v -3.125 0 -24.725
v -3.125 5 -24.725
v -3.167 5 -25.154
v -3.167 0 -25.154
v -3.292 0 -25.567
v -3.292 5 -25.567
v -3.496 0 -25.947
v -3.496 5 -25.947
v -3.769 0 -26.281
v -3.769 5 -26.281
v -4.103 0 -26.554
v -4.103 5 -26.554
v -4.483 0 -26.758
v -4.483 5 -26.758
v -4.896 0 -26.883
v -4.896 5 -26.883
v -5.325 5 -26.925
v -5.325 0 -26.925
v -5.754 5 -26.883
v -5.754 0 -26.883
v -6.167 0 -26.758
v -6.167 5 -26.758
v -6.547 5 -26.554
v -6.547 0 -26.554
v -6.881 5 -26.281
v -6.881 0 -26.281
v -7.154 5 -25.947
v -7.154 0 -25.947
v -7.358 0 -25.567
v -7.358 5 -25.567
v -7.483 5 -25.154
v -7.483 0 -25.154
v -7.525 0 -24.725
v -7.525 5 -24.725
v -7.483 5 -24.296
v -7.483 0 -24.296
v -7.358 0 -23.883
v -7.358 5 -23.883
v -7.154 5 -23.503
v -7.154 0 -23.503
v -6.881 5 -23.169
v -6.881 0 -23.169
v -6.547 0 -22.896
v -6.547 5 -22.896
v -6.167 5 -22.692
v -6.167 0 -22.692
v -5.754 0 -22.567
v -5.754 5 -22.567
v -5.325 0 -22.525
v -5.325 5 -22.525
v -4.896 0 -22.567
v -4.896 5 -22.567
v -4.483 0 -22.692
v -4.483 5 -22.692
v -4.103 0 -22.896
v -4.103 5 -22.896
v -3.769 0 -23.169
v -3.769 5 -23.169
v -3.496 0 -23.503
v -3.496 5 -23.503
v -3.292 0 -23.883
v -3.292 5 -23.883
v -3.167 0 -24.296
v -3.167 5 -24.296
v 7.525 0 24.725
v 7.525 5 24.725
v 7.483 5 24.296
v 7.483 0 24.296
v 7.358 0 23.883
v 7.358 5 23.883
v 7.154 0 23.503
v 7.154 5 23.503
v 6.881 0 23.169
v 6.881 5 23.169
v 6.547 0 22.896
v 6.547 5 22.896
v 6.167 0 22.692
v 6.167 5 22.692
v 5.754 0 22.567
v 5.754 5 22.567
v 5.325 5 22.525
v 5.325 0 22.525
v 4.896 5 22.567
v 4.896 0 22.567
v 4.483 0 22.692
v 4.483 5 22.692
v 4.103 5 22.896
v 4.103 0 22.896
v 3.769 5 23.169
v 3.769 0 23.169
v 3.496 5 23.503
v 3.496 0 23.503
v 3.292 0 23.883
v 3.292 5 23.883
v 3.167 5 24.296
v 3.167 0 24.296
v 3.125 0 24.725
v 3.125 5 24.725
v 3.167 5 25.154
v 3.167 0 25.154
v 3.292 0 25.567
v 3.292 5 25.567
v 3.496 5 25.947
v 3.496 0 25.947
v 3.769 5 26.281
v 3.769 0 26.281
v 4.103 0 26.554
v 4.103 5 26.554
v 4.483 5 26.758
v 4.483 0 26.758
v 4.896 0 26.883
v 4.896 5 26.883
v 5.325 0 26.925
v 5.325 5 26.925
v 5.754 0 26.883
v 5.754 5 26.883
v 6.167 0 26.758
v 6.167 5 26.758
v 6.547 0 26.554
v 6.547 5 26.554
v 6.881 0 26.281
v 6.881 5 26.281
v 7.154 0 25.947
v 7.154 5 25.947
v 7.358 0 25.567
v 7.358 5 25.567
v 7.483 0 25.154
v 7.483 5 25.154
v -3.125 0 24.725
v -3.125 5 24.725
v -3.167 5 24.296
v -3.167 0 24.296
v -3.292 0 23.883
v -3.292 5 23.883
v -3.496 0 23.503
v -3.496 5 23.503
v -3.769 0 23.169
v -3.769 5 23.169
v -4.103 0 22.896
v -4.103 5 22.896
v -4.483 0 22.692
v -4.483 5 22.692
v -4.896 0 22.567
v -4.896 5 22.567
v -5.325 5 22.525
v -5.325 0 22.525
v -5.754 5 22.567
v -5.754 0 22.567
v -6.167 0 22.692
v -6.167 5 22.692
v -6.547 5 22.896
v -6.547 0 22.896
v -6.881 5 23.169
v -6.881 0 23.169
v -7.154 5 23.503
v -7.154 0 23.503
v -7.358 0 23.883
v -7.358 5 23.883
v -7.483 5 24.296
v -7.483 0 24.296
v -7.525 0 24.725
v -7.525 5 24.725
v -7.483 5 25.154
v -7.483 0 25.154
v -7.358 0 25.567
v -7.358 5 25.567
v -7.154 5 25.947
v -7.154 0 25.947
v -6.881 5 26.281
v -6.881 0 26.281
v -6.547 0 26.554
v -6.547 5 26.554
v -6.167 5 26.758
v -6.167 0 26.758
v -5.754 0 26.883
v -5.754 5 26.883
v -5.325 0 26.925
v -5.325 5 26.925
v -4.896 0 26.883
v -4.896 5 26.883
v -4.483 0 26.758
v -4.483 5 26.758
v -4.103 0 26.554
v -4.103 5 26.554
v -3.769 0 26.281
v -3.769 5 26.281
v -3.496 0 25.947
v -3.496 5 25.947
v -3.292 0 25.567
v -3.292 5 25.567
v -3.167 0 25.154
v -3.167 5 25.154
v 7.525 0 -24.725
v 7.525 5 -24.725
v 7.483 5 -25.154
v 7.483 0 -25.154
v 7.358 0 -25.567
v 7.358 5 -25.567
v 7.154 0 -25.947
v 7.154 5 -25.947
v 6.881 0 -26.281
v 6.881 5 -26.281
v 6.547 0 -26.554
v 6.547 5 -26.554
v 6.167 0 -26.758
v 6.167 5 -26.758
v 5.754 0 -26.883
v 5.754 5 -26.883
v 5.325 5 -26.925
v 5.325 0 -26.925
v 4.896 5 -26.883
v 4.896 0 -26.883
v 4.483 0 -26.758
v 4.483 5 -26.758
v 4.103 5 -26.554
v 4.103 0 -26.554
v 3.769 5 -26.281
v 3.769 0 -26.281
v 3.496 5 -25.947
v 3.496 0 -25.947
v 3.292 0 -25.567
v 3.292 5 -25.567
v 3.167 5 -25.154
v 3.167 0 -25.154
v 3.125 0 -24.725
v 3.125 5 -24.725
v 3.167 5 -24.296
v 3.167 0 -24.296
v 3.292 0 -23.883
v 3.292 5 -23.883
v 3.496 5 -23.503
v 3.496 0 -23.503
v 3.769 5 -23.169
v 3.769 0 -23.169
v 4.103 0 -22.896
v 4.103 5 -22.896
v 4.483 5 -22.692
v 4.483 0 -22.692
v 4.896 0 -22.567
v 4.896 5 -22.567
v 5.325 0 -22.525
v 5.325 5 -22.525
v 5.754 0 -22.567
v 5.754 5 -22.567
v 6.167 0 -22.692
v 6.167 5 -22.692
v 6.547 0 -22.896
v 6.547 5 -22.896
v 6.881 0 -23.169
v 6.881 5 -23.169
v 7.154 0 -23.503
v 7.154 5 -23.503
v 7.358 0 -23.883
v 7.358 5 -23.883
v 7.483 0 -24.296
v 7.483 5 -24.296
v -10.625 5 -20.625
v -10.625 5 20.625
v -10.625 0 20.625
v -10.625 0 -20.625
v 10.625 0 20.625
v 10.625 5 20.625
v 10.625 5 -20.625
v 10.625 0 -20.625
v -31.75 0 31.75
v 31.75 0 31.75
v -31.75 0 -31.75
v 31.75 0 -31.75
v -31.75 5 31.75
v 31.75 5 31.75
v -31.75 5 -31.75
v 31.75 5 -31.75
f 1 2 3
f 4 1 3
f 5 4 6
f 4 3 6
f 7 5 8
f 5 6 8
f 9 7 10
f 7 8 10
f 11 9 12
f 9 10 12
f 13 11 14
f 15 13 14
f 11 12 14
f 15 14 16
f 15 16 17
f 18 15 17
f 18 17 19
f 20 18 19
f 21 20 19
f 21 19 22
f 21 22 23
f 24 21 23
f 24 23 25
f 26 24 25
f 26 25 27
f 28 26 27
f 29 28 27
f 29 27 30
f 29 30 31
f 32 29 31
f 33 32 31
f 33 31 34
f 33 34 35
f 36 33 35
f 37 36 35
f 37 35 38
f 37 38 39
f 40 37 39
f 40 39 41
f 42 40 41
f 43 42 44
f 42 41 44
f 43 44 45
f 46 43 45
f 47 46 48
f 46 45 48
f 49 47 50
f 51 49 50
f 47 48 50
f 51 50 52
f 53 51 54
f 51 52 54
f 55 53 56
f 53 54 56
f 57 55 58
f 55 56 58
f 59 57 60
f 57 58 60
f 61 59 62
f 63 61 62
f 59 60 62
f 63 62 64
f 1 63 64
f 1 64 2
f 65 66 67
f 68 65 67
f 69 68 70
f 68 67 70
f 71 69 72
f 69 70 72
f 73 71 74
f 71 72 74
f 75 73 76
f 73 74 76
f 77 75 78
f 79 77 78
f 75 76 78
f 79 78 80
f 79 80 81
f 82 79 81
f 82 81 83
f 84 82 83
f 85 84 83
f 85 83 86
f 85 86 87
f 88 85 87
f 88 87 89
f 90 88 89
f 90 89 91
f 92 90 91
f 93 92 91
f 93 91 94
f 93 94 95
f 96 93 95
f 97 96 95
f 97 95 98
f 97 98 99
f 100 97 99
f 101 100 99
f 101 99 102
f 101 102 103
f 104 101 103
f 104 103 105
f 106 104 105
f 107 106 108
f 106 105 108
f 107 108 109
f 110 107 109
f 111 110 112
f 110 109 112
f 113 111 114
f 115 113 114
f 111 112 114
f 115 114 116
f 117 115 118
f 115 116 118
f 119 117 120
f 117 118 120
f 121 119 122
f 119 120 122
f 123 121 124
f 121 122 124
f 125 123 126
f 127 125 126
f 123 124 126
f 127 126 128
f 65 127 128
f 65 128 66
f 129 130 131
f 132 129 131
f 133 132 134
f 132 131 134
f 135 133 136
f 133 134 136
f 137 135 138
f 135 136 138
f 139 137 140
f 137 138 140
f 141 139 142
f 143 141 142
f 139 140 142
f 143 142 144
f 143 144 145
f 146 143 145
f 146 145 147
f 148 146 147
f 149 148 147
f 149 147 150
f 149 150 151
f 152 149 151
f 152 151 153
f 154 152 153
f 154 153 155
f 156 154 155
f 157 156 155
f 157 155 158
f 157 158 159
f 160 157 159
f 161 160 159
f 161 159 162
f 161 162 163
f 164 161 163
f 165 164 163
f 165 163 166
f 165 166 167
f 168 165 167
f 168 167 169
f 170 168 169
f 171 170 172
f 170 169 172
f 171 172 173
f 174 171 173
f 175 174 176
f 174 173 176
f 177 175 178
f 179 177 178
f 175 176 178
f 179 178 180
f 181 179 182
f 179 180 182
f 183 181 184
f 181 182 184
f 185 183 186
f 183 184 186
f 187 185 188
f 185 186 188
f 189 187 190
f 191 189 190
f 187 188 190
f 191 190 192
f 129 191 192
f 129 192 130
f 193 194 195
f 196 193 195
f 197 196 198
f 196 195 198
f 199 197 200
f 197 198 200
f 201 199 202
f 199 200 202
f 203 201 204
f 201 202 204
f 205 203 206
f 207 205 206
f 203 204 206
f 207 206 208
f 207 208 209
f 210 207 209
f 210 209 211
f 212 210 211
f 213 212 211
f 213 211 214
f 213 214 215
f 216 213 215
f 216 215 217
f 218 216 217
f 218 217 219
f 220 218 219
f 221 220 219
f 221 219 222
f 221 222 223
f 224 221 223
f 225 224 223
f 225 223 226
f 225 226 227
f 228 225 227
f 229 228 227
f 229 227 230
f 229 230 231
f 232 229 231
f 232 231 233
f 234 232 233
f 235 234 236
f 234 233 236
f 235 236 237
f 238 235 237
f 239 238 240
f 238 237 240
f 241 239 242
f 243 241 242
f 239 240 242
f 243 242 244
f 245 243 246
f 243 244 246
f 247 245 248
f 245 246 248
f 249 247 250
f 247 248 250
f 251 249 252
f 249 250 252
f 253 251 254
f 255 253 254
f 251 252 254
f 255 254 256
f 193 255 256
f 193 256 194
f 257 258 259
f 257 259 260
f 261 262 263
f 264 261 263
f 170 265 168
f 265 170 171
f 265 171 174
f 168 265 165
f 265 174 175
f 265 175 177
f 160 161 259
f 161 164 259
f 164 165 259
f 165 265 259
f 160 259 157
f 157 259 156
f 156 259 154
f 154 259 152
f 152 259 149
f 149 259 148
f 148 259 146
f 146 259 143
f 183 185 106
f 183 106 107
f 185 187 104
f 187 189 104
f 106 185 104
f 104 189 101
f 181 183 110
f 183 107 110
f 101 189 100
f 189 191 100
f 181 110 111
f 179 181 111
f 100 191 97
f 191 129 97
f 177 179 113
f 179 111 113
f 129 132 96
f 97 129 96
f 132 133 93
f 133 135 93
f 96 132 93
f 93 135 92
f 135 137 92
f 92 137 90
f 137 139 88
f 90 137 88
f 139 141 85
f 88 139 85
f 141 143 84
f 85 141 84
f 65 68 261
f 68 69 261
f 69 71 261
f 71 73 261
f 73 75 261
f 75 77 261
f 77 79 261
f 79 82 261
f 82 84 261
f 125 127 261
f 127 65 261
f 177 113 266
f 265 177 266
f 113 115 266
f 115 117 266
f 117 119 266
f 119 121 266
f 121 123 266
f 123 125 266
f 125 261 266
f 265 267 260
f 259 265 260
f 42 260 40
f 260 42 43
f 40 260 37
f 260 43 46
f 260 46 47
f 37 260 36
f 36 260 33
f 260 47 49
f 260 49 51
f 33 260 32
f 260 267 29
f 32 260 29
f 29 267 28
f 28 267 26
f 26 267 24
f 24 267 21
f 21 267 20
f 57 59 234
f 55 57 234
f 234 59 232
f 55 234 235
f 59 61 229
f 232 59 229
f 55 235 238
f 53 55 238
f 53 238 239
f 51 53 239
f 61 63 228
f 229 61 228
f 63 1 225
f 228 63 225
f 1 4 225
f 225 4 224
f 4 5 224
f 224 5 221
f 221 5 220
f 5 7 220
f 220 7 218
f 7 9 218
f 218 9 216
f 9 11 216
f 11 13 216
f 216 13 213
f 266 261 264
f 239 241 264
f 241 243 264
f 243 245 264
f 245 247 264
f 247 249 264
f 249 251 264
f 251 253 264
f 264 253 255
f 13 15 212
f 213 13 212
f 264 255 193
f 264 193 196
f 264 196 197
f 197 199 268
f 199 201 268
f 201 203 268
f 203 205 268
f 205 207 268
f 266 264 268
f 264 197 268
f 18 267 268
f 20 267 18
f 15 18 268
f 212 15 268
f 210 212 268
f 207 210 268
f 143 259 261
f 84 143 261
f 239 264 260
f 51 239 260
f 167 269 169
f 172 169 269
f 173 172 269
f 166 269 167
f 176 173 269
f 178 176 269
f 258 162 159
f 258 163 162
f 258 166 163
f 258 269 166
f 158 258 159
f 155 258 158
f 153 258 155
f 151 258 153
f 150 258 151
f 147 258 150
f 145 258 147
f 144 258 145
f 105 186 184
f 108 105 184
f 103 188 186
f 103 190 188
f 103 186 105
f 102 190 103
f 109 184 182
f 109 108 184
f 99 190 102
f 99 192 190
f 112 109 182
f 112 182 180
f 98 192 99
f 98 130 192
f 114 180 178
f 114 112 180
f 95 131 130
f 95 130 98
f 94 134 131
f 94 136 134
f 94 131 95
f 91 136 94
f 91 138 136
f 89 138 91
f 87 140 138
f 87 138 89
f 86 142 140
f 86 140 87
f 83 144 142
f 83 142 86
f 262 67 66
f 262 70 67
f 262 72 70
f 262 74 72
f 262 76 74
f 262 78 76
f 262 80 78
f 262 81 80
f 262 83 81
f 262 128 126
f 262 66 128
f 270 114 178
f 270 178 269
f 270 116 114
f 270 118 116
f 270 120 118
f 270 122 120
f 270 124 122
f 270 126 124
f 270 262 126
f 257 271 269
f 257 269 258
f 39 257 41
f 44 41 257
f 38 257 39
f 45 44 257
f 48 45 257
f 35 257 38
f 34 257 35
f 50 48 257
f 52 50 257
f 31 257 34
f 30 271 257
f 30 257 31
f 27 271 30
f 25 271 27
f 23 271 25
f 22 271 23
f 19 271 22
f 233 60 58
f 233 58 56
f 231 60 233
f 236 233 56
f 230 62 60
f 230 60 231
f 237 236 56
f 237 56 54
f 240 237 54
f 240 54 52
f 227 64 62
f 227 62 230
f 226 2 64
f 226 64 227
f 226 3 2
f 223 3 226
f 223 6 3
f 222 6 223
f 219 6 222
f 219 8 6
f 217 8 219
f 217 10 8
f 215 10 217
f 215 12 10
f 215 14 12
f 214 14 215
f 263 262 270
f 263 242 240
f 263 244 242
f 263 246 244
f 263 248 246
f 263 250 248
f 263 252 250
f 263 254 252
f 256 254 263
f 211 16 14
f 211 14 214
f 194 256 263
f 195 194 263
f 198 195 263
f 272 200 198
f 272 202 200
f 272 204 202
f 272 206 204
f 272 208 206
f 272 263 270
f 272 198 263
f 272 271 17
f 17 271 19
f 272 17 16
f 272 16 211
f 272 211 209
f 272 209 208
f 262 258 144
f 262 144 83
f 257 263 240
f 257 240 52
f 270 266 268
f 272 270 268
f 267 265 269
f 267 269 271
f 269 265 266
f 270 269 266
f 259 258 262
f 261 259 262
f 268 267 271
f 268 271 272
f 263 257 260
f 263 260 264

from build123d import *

# Parameters (mm, degrees)
SKETCH2_W           = 63.5
SKETCH2_H           = 63.5
BOSS_EXTRUDE1_DEPTH = 5
SKETCH3_R           = 2.2
SKETCH3_W           = 21.25
SKETCH3_H           = 41.25
CUT_EXTRUDE1_DEPTH  = 6


with BuildPart() as part:
    # Sketch2 → Boss-Extrude1 (new body)
    with BuildSketch(Plane(origin=(0, 0, 0), x_dir=(1, 0, 0), z_dir=(0, 1, 0))):
        Rectangle(SKETCH2_W, SKETCH2_H)
    extrude(amount=BOSS_EXTRUDE1_DEPTH)

    # Sketch3 → Cut-Extrude1 (cut, through all)
    with BuildSketch(Plane(origin=(0, 5, 0), x_dir=(1, 0, 0), z_dir=(0, 1, 0))):
        with Locations((5.325, 24.725)):
            Circle(SKETCH3_R)
        with Locations((-5.325, 24.725)):
            Circle(SKETCH3_R)
        with Locations((5.325, -24.725)):
            Circle(SKETCH3_R)
        with Locations((-5.325, -24.725)):
            Circle(SKETCH3_R)
        Rectangle(SKETCH3_W, SKETCH3_H)
    extrude(amount=-CUT_EXTRUDE1_DEPTH, mode=Mode.SUBTRACT)


solid = part.part
